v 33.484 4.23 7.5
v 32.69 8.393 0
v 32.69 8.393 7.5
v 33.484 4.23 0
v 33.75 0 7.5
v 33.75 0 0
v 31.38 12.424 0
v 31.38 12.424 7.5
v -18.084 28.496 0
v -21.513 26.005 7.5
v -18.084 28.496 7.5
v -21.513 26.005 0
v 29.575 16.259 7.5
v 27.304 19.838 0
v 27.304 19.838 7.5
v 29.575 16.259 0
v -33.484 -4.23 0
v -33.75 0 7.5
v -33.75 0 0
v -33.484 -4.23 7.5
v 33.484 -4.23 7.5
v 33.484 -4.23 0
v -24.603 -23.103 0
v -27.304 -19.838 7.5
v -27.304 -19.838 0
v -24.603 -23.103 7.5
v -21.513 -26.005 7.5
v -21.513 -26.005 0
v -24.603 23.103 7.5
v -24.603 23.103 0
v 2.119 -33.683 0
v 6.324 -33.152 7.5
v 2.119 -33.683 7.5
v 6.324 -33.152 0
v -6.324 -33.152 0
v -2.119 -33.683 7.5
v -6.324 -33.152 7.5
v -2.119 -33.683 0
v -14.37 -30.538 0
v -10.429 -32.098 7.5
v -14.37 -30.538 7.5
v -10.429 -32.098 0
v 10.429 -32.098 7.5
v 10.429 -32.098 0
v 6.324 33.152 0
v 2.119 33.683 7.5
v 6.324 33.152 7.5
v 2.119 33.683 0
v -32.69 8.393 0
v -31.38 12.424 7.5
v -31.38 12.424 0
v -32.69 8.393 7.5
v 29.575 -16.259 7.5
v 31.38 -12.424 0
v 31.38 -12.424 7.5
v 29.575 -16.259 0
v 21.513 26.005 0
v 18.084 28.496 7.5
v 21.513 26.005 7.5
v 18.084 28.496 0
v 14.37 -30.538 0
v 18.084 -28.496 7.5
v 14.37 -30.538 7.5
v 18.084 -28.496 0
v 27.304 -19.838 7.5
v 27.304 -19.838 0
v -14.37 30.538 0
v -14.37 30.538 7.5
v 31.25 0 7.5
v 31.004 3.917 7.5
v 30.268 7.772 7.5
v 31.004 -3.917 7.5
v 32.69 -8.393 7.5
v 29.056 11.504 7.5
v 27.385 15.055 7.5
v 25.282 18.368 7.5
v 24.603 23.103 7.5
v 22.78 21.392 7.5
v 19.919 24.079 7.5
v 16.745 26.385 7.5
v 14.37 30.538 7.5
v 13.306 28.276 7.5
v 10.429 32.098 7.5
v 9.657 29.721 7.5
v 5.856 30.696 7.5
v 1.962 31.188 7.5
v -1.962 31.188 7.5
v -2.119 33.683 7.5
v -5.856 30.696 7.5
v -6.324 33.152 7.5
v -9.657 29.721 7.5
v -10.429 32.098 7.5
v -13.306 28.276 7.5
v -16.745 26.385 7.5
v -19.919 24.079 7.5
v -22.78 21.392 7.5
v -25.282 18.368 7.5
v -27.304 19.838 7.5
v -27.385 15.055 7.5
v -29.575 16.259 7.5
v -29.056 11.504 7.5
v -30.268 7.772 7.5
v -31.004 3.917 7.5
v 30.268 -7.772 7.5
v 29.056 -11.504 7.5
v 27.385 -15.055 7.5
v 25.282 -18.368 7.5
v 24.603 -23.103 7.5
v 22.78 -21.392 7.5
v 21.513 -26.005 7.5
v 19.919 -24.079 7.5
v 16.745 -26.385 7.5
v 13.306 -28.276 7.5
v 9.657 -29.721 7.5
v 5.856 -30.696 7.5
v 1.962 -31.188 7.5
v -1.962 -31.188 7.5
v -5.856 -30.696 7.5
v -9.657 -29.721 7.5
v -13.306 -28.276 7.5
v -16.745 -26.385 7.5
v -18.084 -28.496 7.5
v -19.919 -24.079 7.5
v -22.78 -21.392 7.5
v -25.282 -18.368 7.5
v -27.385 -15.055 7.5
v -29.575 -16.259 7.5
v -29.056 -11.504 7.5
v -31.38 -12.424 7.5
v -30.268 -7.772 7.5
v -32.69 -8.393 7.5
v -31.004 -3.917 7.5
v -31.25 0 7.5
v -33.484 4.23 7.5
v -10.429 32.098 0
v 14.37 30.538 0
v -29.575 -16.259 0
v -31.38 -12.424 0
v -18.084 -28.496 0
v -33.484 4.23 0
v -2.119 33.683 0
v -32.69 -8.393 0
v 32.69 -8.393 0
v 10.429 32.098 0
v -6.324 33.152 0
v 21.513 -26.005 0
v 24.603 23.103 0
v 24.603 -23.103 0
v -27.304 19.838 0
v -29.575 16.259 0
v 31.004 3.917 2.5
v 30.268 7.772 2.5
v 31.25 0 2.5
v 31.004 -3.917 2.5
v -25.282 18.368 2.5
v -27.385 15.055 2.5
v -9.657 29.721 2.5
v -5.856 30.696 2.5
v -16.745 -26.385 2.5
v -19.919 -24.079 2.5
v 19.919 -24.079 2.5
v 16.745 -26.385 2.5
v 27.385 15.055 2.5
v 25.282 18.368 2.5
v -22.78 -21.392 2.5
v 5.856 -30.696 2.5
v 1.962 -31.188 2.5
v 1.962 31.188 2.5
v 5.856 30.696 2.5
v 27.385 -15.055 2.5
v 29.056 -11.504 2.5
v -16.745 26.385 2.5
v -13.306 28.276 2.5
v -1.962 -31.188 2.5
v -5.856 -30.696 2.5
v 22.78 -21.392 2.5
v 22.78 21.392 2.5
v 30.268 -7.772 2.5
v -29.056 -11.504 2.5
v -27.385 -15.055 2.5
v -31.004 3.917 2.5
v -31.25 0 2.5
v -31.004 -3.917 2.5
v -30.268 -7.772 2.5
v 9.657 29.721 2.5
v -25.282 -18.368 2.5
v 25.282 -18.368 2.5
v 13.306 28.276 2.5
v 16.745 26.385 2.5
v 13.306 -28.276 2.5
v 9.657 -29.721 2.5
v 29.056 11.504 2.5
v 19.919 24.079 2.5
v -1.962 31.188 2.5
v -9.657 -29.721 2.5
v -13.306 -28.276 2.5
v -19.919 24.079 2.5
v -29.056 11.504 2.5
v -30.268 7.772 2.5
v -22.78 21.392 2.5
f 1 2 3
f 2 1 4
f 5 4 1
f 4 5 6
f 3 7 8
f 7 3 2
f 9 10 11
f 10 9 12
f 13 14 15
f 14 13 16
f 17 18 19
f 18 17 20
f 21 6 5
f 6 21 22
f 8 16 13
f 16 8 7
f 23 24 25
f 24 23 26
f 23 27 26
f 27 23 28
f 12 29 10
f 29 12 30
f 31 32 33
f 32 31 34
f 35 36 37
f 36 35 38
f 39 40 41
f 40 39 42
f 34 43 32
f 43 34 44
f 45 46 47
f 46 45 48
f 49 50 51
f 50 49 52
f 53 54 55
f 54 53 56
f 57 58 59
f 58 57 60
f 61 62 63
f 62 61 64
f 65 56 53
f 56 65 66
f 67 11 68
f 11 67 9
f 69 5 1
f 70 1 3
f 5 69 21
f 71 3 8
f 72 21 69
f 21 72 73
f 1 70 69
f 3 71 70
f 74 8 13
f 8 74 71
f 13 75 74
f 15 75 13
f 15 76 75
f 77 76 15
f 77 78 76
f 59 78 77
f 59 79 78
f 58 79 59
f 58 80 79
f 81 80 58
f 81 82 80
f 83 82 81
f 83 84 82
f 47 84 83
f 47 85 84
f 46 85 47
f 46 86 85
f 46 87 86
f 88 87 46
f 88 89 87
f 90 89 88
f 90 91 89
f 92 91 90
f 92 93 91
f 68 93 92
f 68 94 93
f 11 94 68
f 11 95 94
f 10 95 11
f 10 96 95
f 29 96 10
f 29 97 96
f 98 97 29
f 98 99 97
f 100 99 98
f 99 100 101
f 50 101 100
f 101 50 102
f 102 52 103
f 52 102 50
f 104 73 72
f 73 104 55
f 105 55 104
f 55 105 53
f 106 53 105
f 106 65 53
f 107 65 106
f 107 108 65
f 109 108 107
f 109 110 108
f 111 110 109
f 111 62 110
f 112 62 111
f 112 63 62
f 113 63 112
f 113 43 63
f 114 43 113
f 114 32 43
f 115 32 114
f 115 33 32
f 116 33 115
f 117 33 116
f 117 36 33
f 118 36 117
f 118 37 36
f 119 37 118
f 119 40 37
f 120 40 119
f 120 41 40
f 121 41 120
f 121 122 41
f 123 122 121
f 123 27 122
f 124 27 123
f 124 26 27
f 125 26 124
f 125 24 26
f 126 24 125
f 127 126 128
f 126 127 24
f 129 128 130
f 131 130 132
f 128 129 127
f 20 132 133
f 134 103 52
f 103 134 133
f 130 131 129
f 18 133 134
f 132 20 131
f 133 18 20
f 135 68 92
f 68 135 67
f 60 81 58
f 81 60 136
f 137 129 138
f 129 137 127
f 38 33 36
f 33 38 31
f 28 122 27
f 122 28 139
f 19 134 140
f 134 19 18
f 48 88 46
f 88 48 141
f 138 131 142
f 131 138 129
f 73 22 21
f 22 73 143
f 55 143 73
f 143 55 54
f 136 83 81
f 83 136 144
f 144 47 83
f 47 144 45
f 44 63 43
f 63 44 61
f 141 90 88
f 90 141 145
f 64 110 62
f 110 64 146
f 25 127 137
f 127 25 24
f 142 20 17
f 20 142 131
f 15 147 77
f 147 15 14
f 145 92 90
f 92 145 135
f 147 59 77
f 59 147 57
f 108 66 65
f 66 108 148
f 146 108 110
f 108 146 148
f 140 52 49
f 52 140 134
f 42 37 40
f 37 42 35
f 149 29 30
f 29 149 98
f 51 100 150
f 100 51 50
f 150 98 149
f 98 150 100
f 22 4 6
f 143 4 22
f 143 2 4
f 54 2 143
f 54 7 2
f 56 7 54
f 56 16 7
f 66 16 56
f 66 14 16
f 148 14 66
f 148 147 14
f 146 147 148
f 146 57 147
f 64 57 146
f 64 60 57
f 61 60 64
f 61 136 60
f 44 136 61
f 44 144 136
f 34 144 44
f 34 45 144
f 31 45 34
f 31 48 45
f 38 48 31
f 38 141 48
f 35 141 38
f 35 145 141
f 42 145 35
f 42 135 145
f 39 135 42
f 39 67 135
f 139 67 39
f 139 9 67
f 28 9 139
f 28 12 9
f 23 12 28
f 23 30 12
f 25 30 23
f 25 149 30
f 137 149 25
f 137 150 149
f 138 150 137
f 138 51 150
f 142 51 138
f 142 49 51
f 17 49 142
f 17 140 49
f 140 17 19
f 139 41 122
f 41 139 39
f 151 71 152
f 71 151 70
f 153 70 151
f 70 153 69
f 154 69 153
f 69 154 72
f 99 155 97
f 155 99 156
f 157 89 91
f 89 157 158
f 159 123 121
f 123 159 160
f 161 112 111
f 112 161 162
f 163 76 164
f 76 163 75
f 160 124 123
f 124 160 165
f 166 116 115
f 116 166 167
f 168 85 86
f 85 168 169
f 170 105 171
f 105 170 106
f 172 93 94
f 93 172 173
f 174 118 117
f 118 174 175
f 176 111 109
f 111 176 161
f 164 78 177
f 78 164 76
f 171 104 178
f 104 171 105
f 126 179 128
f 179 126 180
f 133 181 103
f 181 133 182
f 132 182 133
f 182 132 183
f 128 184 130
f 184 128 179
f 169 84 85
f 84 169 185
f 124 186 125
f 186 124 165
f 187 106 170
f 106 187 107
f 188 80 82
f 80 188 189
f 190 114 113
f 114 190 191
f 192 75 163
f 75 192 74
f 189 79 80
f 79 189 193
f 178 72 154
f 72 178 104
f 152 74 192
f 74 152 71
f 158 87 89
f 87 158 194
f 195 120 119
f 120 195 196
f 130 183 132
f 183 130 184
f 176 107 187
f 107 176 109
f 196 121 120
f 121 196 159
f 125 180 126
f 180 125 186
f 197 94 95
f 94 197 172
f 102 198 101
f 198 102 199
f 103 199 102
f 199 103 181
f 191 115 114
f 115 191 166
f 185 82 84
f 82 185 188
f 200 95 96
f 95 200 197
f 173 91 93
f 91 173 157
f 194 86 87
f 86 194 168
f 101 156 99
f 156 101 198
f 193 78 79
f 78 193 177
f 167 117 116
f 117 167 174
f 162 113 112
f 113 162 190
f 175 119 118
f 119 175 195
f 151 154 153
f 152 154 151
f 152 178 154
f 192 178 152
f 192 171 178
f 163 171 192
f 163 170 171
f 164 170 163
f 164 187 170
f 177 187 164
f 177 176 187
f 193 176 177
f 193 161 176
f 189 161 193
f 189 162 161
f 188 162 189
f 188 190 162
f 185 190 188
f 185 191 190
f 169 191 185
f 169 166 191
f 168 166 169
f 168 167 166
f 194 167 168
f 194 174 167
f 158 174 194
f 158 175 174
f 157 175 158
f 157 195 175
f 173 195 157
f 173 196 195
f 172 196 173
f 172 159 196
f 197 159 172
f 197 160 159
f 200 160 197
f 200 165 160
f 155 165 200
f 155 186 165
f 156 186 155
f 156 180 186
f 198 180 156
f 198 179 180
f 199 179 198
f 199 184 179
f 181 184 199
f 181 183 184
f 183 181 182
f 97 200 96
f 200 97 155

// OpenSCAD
//lens cover inputs
//inside diameter of cover in millimeters
d=62.5;


//desired thickness of cover
h=2.5;

//height of rim (must be greater than h)
rh=5;

//desired thickness of rim
rt=2.5;


//default calculations (do not alter)
rh1=rh+h;
r=d/2;
r1=r+rt;
difference() {
cylinder(rh1,r=r1,true,$fn=50);
translate([0,0,h]) cylinder(10000000000,r=r,true,$fn=50);}
